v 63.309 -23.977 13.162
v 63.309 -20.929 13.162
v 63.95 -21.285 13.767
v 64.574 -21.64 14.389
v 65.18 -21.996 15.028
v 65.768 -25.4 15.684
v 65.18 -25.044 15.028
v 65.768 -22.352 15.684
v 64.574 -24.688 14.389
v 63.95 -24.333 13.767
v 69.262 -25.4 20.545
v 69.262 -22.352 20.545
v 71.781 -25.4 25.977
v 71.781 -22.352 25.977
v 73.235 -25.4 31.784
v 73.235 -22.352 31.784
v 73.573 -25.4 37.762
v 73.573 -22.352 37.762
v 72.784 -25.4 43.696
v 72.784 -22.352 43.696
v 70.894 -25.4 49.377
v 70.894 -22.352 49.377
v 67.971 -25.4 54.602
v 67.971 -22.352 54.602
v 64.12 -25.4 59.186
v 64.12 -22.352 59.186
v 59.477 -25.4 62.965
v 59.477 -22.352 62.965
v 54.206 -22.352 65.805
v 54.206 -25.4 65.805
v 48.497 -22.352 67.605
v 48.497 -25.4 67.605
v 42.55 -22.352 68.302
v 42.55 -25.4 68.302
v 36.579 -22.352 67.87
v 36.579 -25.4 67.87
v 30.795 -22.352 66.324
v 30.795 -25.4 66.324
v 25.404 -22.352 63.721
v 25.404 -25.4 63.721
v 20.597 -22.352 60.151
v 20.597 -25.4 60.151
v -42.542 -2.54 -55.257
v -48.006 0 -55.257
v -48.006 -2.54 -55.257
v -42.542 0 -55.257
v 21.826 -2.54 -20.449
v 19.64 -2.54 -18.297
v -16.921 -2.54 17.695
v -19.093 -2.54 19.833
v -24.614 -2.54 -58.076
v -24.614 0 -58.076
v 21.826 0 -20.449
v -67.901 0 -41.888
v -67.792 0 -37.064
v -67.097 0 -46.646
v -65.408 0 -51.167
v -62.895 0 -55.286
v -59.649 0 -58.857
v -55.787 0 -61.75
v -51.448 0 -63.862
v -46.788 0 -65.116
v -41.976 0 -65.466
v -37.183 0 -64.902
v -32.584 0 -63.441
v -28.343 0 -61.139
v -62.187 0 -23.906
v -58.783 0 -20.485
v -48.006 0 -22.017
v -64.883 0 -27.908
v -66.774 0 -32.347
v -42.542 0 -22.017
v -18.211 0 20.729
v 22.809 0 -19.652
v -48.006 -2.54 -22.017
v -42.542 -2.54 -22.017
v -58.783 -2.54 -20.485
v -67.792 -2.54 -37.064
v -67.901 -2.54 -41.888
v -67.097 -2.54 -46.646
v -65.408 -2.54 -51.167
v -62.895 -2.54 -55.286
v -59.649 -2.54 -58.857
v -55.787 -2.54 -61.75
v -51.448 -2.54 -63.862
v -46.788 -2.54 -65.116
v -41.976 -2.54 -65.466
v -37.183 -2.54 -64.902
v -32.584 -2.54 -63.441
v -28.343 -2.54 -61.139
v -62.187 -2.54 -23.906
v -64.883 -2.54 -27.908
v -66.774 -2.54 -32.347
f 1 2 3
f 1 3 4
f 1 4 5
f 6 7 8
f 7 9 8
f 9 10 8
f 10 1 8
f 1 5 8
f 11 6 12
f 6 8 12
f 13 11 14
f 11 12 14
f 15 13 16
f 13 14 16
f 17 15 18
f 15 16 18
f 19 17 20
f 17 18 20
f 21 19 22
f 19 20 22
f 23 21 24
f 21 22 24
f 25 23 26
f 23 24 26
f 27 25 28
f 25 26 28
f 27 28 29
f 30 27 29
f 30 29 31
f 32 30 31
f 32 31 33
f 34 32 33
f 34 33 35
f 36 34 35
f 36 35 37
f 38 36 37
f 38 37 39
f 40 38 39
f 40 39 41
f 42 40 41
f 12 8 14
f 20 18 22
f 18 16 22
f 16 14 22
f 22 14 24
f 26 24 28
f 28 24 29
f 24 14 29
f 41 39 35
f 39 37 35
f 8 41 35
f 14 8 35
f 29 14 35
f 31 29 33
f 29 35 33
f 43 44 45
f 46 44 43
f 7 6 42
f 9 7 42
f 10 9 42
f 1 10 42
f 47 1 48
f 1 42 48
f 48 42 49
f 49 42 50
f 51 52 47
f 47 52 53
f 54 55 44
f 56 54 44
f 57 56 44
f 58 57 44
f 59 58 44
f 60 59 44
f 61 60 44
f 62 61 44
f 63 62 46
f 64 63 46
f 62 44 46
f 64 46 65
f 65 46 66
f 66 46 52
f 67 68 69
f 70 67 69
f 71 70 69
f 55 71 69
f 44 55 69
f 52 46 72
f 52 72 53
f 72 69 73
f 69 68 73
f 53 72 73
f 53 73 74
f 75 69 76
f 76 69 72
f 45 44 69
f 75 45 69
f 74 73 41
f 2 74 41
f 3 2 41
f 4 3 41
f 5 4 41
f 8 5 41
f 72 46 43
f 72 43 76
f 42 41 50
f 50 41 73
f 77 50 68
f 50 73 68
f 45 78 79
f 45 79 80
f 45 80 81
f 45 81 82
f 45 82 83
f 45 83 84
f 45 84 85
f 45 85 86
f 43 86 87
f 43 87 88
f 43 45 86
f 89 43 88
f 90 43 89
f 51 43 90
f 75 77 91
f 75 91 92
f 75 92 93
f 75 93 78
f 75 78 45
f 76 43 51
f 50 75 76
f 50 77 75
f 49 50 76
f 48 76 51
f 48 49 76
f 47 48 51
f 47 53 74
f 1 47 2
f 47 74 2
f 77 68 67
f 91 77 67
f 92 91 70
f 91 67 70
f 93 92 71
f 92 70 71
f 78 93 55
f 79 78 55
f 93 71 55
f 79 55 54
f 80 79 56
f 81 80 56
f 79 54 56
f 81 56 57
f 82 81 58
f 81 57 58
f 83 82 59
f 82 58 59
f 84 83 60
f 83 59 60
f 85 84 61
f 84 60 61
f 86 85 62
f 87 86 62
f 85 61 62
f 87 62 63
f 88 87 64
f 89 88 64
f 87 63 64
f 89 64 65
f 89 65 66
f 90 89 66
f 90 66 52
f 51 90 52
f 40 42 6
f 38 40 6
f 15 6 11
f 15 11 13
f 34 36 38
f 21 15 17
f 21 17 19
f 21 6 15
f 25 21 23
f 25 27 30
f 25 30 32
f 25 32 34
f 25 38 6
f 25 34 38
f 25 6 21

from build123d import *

# Parameters (mm, degrees)
F0_W     = 5.4636245876
F0_H     = 33.2398892505
F1_DEPTH = 2.54
F2_DEPTH = 25.4
F4_DEPTH = 125.8997323481
F5_DEPTH = 125.8997323481
F6_W     = 22.352
F6_H     = 49.1605467501
F7_DEPTH = 125.8997323481


with BuildPart() as f1:
    # F0 (on Front) → F1 (new body)
    with BuildSketch(Plane.XZ):
        with BuildLine():
            ThreePointArc((-58.7834570181, -20.4847763815), (-61.356974344, -57.1489152116), (-24.6143243603, -58.0761367374))
            Line((-24.6143243603, -58.0761367374), (21.8259629316, -20.4486662023))
            Line((21.8259629316, -20.4486662023), (19.6400941384, -18.2968238675))
            Line((19.6400941384, -18.2968238675), (-26.6574493018, -55.8086385705))
            ThreePointArc((-26.6574493018, -55.8086385705), (-59.1008466393, -55.0994768945), (-56.7221636318, -22.7356265638))
            Line((-56.7221636318, -22.7356265638), (-16.9208807766, 17.6950224269))
            Line((-16.9208807766, 17.6950224269), (-19.0929825471, 19.8333120442))
            Line((-19.0929825471, 19.8333120442), (-58.7834570181, -20.4847763815))
        make_face()
        with BuildLine():
            Line((-26.6574493018, -55.8086385705), (19.6400941384, -18.2968238675))
            Line((19.6400941384, -18.2968238675), (-16.9208807766, 17.6950224269))
            Line((-16.9208807766, 17.6950224269), (-56.7221636318, -22.7356265638))
            ThreePointArc((-56.7221636318, -22.7356265638), (-59.1008466393, -55.0994768945), (-26.6574493018, -55.8086385705))
        make_face()
        with Locations((-45.2741895661, -38.6369622716)):
            Rectangle(F0_W, F0_H, mode=Mode.SUBTRACT)
    extrude(amount=F1_DEPTH)

    # F0 (on Front) → F2 (join)
    with BuildSketch(Plane.XZ):
        with BuildLine():
            Line((19.6400941384, -18.2968238675), (21.8259629316, -20.4486662023))
            Line((21.8259629316, -20.4486662023), (63.3089077462, 13.162200025))
            ThreePointArc((63.3089077462, 13.162200025), (65.3407579963, 57.9152109511), (20.5974919239, 60.1514004699))
            Line((20.5974919239, 60.1514004699), (-19.0929825471, 19.8333120442))
            Line((-19.0929825471, 19.8333120442), (-16.9208807766, 17.6950224269))
            Line((-16.9208807766, 17.6950224269), (22.703735232, 57.9462109895))
            ThreePointArc((22.703735232, 57.9462109895), (63.0846270143, 55.8657762462), (61.315579372, 15.4700450325))
            Line((61.315579372, 15.4700450325), (19.6400941384, -18.2968238675))
        make_face()
        with BuildLine():
            Line((-16.9208807766, 17.6950224269), (19.6400941384, -18.2968238675))
            Line((19.6400941384, -18.2968238675), (61.315579372, 15.4700450325))
            ThreePointArc((61.315579372, 15.4700450325), (63.0846270143, 55.8657762462), (22.703735232, 57.9462109895))
            Line((22.703735232, 57.9462109895), (-16.9208807766, 17.6950224269))
        make_face()
    extrude(amount=F2_DEPTH)

    # F3 (on face) → F4 (cut, through all)
    with BuildSketch(Plane(origin=(-19.611689488, 0, 19.306402941), x_dir=(0, -1, 0), z_dir=(-0.7126316385, 0, 0.7015384151))):
        Polygon((25.4, 57.3157229122), (2.54, 0.7393849428), (25.4, 0.7393849428), align=None)
    extrude(amount=-F4_DEPTH, mode=Mode.SUBTRACT)

    # F3 (on face) → F5 (cut, through all)
    with BuildSketch(Plane(origin=(-19.611689488, 0, 19.306402941), x_dir=(0, -1, 0), z_dir=(-0.7126316385, 0, 0.7015384151))):
        Polygon((0, 1.9966368976), (22.352, 57.3157229122), (0, 57.3157229122), align=None)
    extrude(amount=-F5_DEPTH, mode=Mode.SUBTRACT)

    # F6 (on face) → F7 (cut, through all)
    with BuildSketch(Plane(origin=(-19.611689488, 0, 19.306402941), x_dir=(0, -1, 0), z_dir=(-0.7126316385, 0, 0.7015384151))):
        with Locations((11.176, 81.8959962873)):
            Rectangle(F6_W, F6_H)
    extrude(amount=-F7_DEPTH, mode=Mode.SUBTRACT)


solid = f1.part
